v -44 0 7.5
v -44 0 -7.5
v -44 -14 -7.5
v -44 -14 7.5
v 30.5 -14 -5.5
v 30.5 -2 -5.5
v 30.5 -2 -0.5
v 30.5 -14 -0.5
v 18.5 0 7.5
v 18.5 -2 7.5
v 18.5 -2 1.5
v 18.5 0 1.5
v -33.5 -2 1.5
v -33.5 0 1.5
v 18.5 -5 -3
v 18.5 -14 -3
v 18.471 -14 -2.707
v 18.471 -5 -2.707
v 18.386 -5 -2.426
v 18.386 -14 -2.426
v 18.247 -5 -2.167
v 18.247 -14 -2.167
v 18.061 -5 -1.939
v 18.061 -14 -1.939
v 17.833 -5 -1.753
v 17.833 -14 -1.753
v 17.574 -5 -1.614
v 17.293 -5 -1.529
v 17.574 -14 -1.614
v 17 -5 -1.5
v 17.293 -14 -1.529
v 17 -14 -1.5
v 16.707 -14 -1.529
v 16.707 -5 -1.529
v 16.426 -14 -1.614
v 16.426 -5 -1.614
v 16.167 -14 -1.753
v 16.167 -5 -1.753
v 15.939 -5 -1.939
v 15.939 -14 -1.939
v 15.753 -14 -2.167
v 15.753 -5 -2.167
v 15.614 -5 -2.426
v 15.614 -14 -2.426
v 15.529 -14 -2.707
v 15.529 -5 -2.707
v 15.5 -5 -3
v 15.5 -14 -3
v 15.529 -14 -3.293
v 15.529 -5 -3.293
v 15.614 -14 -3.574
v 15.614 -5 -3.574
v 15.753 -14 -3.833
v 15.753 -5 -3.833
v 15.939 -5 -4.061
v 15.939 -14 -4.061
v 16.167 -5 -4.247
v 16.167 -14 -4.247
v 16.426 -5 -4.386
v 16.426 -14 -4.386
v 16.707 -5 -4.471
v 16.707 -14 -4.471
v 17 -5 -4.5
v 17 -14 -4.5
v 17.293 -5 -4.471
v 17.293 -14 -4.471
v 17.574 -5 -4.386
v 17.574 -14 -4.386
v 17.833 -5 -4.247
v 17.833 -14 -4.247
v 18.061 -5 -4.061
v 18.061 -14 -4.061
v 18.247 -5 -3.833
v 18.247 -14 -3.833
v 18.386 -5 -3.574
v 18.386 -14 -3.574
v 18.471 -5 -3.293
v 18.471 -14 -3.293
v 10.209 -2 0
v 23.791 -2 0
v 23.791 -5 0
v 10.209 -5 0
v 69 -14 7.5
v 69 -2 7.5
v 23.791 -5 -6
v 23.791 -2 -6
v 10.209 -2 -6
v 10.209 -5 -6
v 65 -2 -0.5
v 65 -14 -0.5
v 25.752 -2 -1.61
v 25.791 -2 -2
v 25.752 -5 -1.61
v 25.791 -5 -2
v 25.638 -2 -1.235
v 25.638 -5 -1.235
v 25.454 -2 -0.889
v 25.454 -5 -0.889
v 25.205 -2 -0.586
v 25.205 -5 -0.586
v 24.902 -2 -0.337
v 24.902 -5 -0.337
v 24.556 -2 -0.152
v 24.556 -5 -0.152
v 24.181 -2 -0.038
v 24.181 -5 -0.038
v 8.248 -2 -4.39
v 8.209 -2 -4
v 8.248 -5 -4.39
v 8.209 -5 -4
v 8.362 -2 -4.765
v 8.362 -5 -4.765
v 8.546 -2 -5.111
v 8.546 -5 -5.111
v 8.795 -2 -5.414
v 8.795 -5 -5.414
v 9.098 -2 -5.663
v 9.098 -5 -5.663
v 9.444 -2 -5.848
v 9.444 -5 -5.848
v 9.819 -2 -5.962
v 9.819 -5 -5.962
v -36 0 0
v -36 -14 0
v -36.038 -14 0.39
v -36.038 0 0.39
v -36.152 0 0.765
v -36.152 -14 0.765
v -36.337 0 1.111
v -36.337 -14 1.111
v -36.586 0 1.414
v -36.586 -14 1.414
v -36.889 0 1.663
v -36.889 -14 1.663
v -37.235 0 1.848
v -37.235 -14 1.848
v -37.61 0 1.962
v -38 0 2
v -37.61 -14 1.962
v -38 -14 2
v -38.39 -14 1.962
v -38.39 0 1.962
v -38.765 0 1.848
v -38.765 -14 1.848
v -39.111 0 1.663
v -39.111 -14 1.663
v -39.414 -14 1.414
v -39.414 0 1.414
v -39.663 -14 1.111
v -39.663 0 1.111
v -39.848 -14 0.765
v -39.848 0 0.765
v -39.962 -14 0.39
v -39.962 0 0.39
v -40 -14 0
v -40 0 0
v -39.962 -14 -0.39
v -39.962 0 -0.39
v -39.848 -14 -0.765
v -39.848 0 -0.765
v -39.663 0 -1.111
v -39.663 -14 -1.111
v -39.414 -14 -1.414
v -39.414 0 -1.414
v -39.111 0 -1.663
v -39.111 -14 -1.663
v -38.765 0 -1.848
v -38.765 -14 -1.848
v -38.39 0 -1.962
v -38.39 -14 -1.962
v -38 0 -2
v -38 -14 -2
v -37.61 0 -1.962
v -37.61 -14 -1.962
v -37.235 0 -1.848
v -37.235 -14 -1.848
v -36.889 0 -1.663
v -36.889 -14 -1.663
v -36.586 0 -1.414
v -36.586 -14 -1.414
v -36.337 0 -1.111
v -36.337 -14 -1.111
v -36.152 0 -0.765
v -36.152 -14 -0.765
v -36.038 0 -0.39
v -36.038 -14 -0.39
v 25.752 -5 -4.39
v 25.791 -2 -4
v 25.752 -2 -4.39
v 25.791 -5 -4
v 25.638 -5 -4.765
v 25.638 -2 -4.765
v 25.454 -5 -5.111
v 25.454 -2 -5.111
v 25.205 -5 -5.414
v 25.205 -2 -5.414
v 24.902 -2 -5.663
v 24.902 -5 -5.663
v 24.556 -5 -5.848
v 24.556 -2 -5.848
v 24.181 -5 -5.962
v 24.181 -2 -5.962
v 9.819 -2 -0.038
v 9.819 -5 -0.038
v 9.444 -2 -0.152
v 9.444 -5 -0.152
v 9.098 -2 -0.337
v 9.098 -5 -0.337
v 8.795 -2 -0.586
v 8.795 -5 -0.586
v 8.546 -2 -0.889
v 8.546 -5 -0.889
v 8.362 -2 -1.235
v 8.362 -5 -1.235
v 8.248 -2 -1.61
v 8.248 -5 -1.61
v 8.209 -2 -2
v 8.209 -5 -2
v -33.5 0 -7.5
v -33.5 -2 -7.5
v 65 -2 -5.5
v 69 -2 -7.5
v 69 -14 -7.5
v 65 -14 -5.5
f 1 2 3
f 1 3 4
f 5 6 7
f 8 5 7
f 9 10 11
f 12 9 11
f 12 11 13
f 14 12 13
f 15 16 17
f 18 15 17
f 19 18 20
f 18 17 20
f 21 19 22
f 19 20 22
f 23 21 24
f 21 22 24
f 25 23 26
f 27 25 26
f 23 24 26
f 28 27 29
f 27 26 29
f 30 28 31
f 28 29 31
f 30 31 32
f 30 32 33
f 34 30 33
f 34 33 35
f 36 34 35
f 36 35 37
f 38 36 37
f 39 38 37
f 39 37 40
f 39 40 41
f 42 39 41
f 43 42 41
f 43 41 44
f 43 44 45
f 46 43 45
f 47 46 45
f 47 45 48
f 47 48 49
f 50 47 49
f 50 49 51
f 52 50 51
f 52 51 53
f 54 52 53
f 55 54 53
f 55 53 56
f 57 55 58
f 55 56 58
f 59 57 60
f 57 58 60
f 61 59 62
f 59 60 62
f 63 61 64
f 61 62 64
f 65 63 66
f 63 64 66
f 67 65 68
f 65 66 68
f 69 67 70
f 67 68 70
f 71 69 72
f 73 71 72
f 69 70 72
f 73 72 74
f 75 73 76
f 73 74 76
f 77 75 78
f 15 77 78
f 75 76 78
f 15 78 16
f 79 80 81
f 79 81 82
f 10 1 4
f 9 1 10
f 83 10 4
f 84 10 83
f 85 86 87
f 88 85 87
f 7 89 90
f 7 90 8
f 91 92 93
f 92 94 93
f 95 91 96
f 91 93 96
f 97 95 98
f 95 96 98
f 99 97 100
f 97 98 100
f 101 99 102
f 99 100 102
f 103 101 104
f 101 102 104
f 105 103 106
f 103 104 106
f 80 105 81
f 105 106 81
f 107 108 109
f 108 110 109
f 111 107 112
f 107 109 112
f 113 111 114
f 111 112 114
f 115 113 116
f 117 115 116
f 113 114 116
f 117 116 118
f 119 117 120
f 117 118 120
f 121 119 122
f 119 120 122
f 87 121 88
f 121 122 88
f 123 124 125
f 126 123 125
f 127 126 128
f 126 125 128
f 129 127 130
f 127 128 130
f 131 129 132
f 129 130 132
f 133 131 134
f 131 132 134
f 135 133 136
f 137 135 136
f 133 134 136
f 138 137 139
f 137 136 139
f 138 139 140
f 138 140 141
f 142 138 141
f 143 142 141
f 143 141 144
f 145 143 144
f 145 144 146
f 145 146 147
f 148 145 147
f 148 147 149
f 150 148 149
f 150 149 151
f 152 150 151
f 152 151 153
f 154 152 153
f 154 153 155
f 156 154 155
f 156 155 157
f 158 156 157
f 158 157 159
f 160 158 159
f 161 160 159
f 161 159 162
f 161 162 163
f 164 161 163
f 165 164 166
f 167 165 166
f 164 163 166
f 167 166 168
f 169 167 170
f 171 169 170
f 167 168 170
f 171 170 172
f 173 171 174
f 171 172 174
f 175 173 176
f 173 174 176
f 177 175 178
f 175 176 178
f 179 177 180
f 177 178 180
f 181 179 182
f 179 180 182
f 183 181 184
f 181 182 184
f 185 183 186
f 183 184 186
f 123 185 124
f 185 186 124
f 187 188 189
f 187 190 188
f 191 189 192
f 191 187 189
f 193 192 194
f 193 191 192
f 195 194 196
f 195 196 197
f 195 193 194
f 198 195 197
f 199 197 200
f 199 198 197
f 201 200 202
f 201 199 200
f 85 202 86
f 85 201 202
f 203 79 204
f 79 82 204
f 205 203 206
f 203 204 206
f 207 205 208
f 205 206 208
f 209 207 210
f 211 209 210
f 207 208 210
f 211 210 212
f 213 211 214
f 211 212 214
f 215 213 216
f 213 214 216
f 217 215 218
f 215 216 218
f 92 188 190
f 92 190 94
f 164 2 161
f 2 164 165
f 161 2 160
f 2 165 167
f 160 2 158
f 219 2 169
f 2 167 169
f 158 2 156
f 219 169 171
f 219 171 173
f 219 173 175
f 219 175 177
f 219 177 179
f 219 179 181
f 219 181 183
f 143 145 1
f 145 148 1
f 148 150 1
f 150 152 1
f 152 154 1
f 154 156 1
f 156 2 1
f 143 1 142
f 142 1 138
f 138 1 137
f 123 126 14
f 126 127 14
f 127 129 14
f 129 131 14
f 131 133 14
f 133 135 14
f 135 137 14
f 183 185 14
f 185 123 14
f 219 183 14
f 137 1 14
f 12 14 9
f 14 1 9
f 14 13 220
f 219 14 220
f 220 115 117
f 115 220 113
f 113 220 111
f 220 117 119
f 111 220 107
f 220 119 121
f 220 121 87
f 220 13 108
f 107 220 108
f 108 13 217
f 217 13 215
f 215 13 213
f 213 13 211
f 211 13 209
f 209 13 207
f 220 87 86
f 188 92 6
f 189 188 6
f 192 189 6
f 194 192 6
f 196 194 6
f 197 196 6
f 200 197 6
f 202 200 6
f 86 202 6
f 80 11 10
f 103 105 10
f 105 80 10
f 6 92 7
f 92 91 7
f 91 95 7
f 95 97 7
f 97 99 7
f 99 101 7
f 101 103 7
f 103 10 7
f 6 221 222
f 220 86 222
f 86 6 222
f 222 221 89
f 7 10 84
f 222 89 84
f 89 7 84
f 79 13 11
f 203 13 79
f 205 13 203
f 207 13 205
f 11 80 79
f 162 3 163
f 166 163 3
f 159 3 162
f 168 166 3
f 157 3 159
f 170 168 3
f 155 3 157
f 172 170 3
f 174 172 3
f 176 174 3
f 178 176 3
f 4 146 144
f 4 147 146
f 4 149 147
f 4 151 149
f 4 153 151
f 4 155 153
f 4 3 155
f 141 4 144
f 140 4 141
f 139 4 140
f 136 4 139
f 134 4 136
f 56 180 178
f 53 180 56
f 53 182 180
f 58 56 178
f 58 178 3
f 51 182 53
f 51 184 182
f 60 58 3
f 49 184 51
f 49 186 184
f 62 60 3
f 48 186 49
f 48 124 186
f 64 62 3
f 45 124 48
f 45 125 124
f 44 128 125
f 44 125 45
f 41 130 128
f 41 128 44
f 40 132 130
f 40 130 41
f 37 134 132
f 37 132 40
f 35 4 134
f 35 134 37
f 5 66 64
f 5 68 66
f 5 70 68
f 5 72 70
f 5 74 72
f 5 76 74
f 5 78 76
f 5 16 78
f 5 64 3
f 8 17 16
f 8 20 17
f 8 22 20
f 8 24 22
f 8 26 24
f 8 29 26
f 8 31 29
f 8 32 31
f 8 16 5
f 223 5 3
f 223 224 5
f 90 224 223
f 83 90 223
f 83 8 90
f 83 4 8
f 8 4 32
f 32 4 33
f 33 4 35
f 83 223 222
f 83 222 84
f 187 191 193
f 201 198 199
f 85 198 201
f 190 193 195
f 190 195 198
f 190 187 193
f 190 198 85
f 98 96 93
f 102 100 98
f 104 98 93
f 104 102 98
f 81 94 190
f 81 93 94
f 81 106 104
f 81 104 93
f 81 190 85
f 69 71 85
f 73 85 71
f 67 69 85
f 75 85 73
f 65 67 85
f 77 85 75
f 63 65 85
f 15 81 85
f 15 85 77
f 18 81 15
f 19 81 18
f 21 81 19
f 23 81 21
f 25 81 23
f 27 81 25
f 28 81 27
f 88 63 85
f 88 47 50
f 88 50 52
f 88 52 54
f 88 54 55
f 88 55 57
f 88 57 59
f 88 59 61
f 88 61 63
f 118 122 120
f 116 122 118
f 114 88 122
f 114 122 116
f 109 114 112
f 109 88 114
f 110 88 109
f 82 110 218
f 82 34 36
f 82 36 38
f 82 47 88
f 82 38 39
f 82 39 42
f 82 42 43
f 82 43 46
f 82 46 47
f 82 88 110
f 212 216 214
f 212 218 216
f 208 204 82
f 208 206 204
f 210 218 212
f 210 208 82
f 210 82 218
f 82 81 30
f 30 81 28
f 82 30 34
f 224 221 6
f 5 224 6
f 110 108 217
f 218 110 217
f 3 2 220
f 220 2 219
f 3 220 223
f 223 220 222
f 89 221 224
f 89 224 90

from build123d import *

# Parameters (mm, degrees)
F0_W      = 88
F0_H      = 15
F1_DEPTH  = 14
F3_DEPTH  = 24.5
F4_W      = 113
F4_H      = 15
F5_DEPTH  = 12
F6_W      = 34.5
F6_H      = 5
F7_DEPTH  = 25
F8_R      = 1.5
F9_DEPTH  = 25
F10_W     = 17.581136
F10_H     = 6
F11_DEPTH = 3
F12_R     = 2
F13_R     = 2
F14_DEPTH = 25


with BuildPart() as f1:
    # F0 (on Front) → F1 (new body)
    with BuildSketch(Plane.XZ):
        Rectangle(F0_W, F0_H)
    extrude(amount=F1_DEPTH)

    # F2 (on face) → F3 (cut)
    with BuildSketch(Plane.XZ.offset(14)):
        Polygon((-33.5, 1.5), (-33.5, -7.5), (44, -7.5), (44, 7.5), (18.5, 7.5), (18.5, 1.5), align=None)
    extrude(amount=-F3_DEPTH, mode=Mode.SUBTRACT)

    # F4 (on face) → F5 (join)
    with BuildSketch(Plane.XZ.offset(14)):
        with Locations((12.5, 0)):
            Rectangle(F4_W, F4_H)
    extrude(amount=-F5_DEPTH)

    # F6 (on face) → F7 (cut)
    with BuildSketch(Plane(origin=(0, -2, 0), x_dir=(-1, 0, 0), z_dir=(0, 1, 0))):
        with Locations((-47.75, -3)):
            Rectangle(F6_W, F6_H)
    extrude(amount=-F7_DEPTH, mode=Mode.SUBTRACT)

    # F8 (on face) → F9 (cut)
    with BuildSketch(Plane.XZ.offset(14)):
        with Locations((17, -3)):
            Circle(F8_R)
    extrude(amount=-F9_DEPTH, mode=Mode.SUBTRACT)

    # F10 (on face) → F11 (cut)
    with BuildSketch(Plane(origin=(0, -2, 0), x_dir=(-1, 0, 0), z_dir=(0, 1, 0))):
        with Locations((-17, -3)):
            Rectangle(F10_W, F10_H)
    extrude(amount=-F11_DEPTH, mode=Mode.SUBTRACT)

    # F12
    f12_edges = [f1.edges().sort_by_distance(p)[0] for p in [
        (8.209432, -3.5, 0),
        (8.209432, -3.5, -6),
        (25.790568, -3.5, 0),
        (25.790568, -3.5, -6),
    ]]
    fillet(f12_edges, radius=F12_R)

    # F13 (on face) → F14 (cut)
    with BuildSketch(Plane.XZ.offset(14)):
        with Locations((-38, 0)):
            Circle(F13_R)
    extrude(amount=-F14_DEPTH, mode=Mode.SUBTRACT)


solid = f1.part
